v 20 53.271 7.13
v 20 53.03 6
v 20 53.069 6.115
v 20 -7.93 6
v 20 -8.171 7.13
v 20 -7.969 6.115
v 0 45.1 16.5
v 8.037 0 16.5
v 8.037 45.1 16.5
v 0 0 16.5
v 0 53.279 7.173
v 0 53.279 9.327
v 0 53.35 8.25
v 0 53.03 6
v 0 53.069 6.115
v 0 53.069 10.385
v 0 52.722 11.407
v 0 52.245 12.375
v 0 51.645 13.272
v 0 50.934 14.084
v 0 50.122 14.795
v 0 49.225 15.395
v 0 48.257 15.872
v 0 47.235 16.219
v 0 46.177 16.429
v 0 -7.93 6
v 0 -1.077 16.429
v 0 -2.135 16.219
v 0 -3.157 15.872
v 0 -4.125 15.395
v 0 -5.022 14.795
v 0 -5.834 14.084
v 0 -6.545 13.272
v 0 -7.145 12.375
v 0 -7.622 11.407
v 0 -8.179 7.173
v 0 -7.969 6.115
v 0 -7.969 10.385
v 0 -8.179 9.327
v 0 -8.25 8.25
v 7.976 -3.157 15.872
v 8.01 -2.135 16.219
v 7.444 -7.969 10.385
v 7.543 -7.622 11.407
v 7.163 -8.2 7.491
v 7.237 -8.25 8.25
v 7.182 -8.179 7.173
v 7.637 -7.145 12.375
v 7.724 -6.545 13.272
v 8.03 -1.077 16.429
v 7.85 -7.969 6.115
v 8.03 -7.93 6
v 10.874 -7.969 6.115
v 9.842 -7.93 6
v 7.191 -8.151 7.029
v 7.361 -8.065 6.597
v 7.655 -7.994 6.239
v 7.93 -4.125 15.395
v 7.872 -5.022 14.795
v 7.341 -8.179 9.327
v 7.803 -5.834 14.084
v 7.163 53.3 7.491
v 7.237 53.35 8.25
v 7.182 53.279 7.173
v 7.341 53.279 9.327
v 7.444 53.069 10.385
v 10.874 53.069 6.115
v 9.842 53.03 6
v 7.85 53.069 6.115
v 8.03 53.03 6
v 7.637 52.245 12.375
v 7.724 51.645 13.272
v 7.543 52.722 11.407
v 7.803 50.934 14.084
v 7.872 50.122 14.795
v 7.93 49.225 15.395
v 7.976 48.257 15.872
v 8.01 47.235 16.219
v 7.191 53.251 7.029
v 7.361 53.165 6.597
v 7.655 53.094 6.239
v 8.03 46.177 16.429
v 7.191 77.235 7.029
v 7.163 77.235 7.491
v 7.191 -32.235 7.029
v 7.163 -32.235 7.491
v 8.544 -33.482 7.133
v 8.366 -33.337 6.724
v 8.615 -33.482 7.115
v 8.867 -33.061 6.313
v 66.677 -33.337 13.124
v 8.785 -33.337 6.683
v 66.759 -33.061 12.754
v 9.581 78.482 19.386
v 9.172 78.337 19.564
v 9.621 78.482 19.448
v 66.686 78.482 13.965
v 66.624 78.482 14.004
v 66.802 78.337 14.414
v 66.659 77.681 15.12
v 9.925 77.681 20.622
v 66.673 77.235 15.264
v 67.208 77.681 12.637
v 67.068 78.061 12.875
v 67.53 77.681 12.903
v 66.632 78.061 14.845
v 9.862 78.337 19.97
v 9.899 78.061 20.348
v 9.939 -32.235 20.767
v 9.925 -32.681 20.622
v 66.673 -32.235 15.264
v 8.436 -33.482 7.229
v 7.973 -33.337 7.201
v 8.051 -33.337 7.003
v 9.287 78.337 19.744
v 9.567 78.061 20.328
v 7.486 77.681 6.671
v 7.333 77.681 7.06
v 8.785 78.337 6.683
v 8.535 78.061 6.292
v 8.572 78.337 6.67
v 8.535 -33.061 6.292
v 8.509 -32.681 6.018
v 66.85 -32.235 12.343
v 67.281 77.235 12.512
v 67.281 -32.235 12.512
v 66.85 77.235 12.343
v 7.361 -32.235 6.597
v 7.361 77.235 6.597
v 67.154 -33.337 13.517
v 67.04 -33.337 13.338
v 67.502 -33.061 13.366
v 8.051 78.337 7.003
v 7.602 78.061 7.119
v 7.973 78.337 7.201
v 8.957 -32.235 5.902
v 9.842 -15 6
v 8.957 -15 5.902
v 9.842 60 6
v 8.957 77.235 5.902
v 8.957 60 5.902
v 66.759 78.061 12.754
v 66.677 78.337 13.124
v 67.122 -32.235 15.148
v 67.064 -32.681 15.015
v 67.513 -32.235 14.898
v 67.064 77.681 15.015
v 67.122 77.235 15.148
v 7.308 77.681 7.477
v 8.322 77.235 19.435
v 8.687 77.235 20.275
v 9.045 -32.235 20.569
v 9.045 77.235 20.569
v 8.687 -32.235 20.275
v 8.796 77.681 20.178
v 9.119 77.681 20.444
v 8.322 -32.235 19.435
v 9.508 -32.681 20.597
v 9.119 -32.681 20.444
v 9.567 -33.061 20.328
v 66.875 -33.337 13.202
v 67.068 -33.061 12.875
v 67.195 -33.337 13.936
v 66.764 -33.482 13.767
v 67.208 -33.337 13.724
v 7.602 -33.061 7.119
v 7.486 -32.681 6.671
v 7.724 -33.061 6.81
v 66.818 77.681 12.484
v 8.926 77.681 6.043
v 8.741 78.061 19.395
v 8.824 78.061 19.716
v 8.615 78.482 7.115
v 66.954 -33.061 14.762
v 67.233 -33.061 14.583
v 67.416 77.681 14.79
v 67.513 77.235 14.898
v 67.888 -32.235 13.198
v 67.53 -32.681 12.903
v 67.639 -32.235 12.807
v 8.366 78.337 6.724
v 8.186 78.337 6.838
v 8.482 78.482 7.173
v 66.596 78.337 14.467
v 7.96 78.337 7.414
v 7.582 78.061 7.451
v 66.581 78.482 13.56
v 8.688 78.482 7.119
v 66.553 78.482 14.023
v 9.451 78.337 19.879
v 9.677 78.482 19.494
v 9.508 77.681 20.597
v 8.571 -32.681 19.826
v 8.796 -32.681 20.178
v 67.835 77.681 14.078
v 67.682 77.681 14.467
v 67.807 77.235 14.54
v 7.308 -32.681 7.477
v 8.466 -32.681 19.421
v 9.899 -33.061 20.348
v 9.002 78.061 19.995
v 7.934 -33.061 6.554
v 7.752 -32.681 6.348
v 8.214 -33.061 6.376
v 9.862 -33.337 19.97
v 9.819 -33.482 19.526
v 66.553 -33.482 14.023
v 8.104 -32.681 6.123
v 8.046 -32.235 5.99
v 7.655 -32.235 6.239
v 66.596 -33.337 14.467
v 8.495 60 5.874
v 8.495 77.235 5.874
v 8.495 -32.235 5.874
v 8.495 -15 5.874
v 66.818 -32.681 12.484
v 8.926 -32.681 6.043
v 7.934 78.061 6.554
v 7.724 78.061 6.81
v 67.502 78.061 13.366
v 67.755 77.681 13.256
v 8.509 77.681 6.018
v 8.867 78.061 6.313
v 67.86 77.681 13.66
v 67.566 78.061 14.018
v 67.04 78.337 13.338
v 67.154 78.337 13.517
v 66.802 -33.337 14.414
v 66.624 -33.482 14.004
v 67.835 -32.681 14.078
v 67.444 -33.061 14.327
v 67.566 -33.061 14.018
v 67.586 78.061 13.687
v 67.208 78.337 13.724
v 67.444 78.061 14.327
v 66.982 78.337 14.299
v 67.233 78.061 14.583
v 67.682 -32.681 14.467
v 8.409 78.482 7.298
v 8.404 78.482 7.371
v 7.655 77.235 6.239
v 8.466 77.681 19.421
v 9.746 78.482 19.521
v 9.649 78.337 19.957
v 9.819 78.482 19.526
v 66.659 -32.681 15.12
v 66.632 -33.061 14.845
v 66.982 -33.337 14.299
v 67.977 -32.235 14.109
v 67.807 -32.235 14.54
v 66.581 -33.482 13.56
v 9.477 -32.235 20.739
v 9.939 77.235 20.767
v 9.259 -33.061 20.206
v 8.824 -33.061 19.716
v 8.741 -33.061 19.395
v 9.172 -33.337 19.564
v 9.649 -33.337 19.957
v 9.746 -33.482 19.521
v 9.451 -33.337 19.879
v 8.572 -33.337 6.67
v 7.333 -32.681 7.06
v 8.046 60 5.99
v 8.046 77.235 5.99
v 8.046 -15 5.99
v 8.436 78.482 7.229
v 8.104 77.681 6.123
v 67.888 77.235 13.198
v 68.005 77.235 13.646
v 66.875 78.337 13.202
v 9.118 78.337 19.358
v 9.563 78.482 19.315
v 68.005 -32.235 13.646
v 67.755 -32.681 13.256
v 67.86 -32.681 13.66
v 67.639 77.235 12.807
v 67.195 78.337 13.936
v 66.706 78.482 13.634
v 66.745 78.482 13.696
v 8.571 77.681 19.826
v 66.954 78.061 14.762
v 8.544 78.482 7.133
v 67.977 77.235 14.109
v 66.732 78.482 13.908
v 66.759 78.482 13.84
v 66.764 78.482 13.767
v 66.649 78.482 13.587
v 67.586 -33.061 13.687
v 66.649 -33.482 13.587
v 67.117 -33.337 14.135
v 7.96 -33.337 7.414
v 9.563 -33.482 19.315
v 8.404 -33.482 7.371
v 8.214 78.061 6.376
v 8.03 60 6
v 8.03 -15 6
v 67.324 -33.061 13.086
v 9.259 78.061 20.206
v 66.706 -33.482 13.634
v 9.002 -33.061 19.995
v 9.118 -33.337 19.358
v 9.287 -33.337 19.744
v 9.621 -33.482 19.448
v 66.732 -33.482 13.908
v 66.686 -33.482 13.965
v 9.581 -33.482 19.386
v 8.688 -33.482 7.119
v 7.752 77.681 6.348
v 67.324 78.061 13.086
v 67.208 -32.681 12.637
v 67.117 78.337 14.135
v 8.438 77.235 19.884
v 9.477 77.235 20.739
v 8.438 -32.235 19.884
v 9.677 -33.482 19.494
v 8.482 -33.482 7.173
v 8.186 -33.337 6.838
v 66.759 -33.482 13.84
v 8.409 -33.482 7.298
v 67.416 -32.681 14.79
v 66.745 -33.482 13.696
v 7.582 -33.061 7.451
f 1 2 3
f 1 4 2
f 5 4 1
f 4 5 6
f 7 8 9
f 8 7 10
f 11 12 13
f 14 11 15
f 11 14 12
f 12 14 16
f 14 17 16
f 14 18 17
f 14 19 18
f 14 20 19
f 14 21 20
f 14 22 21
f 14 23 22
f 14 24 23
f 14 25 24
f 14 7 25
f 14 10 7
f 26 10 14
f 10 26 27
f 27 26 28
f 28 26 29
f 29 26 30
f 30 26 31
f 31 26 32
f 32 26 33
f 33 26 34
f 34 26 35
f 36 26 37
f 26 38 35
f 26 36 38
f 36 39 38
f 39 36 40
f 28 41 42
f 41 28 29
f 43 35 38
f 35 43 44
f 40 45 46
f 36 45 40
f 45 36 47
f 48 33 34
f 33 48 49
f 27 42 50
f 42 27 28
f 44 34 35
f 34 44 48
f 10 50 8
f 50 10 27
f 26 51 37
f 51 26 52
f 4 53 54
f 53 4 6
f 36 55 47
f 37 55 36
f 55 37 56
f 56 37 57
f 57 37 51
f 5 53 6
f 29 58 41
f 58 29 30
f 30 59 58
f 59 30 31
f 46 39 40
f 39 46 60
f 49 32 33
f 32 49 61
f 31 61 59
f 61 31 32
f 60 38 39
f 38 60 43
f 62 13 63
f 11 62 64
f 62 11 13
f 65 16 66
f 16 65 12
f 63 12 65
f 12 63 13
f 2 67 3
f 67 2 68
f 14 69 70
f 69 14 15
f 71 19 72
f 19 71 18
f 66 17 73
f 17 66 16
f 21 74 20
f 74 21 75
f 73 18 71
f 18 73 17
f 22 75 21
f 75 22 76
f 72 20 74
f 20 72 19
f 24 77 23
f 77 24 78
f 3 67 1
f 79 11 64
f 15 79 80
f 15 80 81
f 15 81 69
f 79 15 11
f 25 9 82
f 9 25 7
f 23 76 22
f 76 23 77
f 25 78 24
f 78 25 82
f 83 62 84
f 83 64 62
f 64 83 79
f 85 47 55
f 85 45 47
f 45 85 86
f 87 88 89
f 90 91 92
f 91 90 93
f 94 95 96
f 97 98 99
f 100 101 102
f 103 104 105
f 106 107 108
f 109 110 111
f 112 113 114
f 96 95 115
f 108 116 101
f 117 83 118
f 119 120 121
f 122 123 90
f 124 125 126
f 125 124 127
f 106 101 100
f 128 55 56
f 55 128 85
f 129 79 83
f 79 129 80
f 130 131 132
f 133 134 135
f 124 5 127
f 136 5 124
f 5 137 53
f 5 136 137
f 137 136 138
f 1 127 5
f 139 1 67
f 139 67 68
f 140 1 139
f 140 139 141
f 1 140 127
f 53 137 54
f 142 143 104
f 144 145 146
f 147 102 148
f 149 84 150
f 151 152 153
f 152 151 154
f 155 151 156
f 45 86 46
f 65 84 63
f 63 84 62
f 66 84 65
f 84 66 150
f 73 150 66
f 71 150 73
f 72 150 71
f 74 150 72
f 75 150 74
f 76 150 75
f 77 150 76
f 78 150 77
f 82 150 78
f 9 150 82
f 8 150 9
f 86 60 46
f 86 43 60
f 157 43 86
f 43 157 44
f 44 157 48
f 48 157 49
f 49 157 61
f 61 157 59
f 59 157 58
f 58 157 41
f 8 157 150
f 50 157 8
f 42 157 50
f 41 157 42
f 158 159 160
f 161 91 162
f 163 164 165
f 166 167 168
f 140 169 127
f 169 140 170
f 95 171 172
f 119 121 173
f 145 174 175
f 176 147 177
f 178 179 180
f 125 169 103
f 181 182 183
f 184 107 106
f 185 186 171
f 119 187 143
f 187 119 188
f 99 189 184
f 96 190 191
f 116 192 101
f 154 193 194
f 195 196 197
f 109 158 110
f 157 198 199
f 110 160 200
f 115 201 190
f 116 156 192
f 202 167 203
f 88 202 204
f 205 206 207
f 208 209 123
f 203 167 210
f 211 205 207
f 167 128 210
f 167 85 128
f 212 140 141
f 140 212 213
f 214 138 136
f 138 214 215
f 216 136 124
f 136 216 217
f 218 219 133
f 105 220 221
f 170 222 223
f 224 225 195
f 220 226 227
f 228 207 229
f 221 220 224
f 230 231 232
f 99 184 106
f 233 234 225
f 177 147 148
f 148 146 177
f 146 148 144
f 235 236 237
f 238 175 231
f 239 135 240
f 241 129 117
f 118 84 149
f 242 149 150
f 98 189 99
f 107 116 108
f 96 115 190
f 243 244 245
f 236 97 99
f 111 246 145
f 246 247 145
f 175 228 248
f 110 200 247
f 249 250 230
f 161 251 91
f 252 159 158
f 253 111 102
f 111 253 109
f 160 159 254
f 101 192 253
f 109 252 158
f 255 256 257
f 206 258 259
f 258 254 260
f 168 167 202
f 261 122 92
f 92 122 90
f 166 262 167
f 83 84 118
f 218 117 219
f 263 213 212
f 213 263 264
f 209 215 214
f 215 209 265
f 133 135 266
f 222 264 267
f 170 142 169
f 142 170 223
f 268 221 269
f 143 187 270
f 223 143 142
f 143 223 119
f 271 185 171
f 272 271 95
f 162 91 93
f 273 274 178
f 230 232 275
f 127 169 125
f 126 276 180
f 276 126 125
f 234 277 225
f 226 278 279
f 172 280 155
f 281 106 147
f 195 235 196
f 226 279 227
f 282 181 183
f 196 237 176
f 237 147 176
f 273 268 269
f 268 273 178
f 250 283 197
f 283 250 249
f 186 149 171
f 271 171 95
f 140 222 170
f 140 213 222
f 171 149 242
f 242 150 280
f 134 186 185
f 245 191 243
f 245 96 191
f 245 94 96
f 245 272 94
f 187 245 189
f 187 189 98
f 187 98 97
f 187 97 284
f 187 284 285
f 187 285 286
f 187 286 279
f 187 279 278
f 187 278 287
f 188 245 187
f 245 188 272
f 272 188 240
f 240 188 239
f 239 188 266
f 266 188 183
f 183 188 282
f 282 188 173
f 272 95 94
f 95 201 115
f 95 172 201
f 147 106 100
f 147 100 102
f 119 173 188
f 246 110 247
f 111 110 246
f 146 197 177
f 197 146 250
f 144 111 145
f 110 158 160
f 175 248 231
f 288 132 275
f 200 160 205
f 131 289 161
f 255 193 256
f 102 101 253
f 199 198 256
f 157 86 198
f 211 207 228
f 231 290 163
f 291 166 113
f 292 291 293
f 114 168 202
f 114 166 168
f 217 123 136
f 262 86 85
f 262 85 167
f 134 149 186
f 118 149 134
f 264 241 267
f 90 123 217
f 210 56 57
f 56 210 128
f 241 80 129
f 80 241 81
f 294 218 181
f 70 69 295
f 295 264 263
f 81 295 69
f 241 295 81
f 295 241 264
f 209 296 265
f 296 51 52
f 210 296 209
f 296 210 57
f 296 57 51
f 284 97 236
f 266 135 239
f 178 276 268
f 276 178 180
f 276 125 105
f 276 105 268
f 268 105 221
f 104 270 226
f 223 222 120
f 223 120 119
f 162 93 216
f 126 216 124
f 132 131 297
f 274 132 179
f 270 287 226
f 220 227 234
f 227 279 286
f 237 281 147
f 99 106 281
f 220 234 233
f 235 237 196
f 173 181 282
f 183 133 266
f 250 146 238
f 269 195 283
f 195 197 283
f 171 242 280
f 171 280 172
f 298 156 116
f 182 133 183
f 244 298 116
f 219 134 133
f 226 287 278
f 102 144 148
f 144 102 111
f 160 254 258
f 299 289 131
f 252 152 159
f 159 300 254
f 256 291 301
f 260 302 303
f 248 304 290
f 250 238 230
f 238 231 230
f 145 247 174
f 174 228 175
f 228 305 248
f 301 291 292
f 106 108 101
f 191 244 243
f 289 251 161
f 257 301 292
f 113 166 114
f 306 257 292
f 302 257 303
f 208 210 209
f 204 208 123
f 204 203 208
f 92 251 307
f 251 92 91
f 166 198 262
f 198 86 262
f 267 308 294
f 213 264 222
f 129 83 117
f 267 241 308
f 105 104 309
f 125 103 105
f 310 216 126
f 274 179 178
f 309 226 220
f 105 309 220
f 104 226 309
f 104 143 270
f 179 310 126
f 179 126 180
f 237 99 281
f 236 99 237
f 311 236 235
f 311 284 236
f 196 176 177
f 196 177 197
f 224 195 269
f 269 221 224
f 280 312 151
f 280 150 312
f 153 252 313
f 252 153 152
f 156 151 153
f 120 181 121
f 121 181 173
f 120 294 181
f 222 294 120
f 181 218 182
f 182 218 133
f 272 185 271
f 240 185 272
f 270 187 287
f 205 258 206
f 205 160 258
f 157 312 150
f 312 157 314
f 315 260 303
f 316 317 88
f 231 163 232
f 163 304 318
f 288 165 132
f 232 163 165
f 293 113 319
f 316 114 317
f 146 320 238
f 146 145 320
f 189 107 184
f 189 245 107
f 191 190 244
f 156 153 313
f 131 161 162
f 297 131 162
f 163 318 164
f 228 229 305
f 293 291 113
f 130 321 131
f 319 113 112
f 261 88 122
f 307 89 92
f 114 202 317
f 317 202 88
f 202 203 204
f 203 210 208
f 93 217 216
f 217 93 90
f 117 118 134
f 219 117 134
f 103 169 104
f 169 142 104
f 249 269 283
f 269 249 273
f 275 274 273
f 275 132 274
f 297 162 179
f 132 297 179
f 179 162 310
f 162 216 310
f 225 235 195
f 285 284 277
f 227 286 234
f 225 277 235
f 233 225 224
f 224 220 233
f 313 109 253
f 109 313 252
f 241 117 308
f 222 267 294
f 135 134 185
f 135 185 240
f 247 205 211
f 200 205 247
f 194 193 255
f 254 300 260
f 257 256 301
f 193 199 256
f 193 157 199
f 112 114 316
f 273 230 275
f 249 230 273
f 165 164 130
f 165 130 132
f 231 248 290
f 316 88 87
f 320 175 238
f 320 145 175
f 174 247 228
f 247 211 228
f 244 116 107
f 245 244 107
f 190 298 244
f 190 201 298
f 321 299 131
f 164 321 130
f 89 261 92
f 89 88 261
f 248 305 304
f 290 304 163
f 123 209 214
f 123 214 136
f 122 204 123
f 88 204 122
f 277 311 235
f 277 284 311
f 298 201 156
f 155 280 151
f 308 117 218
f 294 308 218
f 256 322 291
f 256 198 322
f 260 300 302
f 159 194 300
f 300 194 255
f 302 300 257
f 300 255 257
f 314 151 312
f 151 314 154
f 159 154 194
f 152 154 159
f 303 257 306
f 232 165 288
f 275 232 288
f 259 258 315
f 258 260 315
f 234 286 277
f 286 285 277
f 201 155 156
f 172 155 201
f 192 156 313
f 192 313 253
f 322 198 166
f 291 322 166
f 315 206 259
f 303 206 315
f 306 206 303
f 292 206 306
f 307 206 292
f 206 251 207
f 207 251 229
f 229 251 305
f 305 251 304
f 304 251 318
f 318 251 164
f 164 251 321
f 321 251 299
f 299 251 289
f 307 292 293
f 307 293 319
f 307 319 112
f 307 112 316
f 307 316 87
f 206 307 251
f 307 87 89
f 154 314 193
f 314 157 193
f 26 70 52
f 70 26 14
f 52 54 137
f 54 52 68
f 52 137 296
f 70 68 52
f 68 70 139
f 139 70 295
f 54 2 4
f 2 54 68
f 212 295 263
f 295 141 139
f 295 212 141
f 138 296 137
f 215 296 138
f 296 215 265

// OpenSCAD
/*
 * Nomad Core - Cable Cutout v0.1
 * Composite cable cutout shape for Stream Deck interface plate
 *
 * Build this cutout as a standalone module, then import with `use` into
 * streamdeck_interface_plate.scad for boolean subtraction.
 */

// ============================================
// CABLE CUTOUT CONFIGURATION
// ============================================
// Composite shape components are defined incrementally.

// Cuboid 1
cuboid_1_pos = [0, 0, 0];           // [X, Y, Z] (mm)
cuboid_1_rot = [0, 0, 0];           // [X, Y, Z] rotation (degrees)
cuboid_1_size = [20.0, 45.1, 16.5]; // [X, Y, Z] (mm)

// Cylinders (2x, identical except placement)
cylinder_dia = 16.5;                // Diameter (mm)
cylinder_length = 20.0;             // Length along X (mm)

// Cuboid 2 (subtractive boolean)
cuboid_2_size = [20.0, 75.0, 6.0];  // [X, Y, Z] (mm)
cuboid_2_pos = [0.0, -15.0, 0.0];   // [X, Y, Z] (mm) - cuts lower 6mm across shape

// Wedge (additive shape)
// Upside down: sloped face on the underside, nose pointing toward +X
wedge_cutout_pos = [7.0, 78.5, 6.0];     // [X, Y, Z] (mm)
wedge_cutout_rot = [90.0, 5.54, 0.0];      // [X, Y, Z] rotation (degrees)
wedge_cutout_size = [60.0, 112, 15.0];   // [X, Y, Z] (mm)
wedge_edge_radius = 1.5;                 // Rounded edge radius on all wedge edges (mm)
rounding_fn = $preview ? 10 : 20;        // Sphere smoothness for full-edge rounding
show_wedge_cutout_preview = true;        // Show/hide wedge overlay for positioning

// ============================================
// RENDER QUALITY
// ============================================
preview_fn = 20;   // Faster viewport interaction
export_fn = 48;    // Better quality for STL export
$fn = $preview ? preview_fn : export_fn;

// ============================================
// COMPOSITE CABLE CUTOUT
// ============================================
module wedge_cutout_volume() {
    wedge_x = wedge_cutout_size[0];
    wedge_y = wedge_cutout_size[1];
    wedge_z = wedge_cutout_size[2];
    safe_wedge_radius = min(wedge_edge_radius, wedge_x / 2 - 0.01, wedge_y / 2 - 0.01, wedge_z / 2 - 0.01);
    core_x = wedge_x - (2 * safe_wedge_radius);
    core_y = wedge_y - (2 * safe_wedge_radius);
    core_z = wedge_z - (2 * safe_wedge_radius);

    translate(wedge_cutout_pos)
        rotate(wedge_cutout_rot)
            minkowski() {
                translate([safe_wedge_radius, safe_wedge_radius, safe_wedge_radius])
                    linear_extrude(height=core_y, center=false)
                        polygon([
                            [0, 0],
                            [0, core_z],
                            [core_x, core_z]
                        ]);

                sphere(r=safe_wedge_radius, $fn=rounding_fn);
            }
}

module cable_cutout() {
    difference() {
        union() {
            translate(cuboid_1_pos)
                rotate(cuboid_1_rot)
                    cube(cuboid_1_size, center=false);

            translate([
                cuboid_1_pos[0],
                cuboid_1_pos[1],
                cuboid_1_pos[2] + cuboid_1_size[2] / 2
            ])
                rotate([0, 90, 0])
                    cylinder(h=cylinder_length, d=cylinder_dia, center=false);

            translate([
                cuboid_1_pos[0],
                cuboid_1_pos[1] + cuboid_1_size[1],
                cuboid_1_pos[2] + cuboid_1_size[2] / 2
            ])
                rotate([0, 90, 0])
                    cylinder(h=cylinder_length, d=cylinder_dia, center=false);

            wedge_cutout_volume();
        }

        translate(cuboid_2_pos)
            cube(cuboid_2_size, center=false);
    }
}

// ============================================
// MAIN RENDER
// ============================================
cable_cutout();

if ($preview && show_wedge_cutout_preview) {
    #color([1.0, 0.5, 0.1, 0.6])
        wedge_cutout_volume();
}
